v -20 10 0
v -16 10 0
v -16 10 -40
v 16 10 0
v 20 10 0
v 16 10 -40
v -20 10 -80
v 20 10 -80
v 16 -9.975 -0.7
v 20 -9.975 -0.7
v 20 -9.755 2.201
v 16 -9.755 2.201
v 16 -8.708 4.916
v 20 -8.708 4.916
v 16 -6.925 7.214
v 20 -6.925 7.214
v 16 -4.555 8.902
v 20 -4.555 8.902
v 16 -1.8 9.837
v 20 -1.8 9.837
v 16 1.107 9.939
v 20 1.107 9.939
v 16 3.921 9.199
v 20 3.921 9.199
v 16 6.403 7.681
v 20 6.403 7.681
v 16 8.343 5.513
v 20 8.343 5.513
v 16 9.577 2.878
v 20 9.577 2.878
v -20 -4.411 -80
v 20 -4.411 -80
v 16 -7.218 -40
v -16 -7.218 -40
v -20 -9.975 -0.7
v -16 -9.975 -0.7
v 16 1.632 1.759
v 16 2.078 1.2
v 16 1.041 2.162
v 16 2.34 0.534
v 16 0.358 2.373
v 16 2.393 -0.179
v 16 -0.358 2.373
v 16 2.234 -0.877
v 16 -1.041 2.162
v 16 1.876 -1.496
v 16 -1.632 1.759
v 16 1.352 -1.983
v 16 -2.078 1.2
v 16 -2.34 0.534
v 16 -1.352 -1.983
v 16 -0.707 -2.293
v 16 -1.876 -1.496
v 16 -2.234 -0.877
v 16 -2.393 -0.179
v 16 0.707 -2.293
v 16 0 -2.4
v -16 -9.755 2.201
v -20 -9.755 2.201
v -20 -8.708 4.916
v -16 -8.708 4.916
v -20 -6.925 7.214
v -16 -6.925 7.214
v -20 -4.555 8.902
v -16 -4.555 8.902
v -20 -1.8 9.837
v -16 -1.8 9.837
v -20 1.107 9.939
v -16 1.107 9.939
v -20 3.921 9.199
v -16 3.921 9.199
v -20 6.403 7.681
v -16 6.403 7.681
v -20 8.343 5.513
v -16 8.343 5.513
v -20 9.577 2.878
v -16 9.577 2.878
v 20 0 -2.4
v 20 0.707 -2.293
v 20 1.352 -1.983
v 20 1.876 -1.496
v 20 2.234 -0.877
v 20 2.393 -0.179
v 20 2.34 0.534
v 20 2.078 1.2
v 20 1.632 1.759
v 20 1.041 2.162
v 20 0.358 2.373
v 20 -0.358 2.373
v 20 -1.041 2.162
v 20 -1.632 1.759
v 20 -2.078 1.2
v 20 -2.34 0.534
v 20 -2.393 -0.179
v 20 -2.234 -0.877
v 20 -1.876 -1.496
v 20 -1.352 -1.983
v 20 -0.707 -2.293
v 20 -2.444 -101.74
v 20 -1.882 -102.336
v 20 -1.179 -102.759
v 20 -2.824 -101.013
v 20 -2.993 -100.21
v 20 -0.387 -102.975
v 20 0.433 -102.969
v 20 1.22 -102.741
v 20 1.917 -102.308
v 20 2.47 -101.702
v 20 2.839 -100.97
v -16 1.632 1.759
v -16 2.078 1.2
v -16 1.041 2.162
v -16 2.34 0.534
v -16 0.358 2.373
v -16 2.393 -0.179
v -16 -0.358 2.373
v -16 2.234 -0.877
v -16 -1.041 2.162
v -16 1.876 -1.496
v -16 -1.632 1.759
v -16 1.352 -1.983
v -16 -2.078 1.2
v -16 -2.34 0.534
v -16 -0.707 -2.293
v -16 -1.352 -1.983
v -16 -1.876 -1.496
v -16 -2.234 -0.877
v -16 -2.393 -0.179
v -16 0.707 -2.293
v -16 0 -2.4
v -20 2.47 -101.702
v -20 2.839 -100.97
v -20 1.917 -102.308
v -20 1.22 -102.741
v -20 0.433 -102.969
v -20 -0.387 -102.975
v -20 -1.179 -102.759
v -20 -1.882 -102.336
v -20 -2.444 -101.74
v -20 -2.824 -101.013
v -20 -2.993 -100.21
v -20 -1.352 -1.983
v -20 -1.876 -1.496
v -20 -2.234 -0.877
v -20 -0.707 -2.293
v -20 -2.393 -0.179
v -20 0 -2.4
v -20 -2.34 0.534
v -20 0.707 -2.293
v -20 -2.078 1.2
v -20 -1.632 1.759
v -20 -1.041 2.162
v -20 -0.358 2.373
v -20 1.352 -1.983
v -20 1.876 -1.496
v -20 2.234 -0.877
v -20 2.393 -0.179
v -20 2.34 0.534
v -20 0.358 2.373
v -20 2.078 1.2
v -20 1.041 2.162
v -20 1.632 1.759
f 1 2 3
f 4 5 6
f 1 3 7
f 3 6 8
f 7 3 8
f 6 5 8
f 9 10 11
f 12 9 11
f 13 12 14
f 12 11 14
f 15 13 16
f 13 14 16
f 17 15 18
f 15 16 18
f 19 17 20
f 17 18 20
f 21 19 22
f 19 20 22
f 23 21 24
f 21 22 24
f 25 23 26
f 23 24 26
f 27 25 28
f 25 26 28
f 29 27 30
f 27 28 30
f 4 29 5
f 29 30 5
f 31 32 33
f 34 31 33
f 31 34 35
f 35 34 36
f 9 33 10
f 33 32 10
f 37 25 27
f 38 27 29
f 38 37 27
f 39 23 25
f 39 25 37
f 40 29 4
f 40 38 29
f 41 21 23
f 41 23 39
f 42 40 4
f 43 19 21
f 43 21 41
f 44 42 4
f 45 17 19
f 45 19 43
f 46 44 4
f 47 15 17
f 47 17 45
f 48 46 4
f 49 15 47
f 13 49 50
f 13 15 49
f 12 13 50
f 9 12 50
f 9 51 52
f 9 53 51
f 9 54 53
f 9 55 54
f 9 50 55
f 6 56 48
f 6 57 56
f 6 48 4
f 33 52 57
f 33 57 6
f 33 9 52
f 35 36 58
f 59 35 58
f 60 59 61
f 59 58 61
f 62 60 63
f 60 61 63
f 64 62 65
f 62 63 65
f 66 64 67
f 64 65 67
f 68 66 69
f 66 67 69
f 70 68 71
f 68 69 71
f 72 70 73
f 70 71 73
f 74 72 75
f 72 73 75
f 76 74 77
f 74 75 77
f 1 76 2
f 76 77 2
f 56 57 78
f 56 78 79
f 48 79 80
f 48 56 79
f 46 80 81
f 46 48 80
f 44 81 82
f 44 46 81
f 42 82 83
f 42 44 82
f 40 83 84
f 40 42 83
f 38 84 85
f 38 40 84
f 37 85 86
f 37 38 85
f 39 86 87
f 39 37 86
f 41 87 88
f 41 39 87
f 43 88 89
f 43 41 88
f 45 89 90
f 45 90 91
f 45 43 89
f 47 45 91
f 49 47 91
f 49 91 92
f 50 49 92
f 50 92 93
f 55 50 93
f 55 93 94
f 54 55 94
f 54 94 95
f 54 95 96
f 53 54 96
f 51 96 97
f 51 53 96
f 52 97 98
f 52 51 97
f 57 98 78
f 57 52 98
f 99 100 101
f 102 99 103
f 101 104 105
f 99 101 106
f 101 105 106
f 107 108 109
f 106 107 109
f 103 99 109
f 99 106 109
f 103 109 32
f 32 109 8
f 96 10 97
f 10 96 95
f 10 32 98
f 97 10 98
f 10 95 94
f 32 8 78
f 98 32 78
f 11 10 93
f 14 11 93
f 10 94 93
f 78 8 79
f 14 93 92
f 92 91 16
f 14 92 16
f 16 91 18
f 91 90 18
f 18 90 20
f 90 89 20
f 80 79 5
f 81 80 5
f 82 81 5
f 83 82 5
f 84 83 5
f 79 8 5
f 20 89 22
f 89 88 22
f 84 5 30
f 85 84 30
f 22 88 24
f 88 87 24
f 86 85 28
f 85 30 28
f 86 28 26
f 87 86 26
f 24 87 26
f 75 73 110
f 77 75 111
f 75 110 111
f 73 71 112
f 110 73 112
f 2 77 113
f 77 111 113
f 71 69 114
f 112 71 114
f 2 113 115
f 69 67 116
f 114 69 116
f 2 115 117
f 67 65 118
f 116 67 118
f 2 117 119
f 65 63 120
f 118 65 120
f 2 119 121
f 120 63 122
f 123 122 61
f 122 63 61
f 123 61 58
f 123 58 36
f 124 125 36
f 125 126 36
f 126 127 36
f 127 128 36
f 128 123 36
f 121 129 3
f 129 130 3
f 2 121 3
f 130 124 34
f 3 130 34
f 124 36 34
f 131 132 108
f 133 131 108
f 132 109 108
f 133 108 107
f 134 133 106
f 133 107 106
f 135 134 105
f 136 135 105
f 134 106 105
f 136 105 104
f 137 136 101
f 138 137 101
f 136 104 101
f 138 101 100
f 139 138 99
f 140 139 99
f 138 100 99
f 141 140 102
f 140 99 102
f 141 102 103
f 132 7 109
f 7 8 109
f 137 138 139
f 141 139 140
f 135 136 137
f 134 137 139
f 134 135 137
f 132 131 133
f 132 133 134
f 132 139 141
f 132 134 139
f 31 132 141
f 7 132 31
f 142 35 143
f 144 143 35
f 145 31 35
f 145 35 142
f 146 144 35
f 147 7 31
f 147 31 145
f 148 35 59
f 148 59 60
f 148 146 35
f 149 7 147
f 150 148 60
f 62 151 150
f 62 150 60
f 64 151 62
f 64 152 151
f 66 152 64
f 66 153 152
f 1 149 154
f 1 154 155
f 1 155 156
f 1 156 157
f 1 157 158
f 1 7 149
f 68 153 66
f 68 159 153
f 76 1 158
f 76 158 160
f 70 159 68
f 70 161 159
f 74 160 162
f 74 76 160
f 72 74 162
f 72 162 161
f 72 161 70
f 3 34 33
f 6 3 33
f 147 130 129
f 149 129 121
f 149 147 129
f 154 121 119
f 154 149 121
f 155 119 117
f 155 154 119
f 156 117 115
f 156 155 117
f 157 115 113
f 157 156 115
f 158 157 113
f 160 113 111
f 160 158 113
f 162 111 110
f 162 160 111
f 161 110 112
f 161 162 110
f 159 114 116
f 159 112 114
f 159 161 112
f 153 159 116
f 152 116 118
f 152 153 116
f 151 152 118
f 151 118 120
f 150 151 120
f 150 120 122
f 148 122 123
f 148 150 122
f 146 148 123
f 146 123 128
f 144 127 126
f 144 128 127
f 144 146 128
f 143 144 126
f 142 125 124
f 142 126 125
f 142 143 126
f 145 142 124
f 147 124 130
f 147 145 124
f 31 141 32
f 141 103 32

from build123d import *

# Parameters (mm, degrees)
SKETCH1_R              = 2.4
ARM_DEPTH              = 20
ELBOW_MOUNT_DEPTH      = 106.399240984
ELBOW_MOUNT_DEPTH_BACK = 106.399240984
SKETCH2_W              = 32
SKETCH2_H              = 50


with BuildPart() as part:
    # Sketch1 → arm (new, symmetric)
    with BuildSketch(Plane(origin=(0, 0, 0), x_dir=(0, 0, -1), z_dir=(1, 0, 0))):
        with BuildLine():
            Line((0, 10), (80, 10))
            Line((80, 10), (100.969511188, 2.839022377))
            ThreePointArc((100.969511188, 2.839022377), (102.974875799, -0.387445454), (100.21, -2.992640974))
            Line((100.21, -2.992640974), (80, -4.410819779))
            Line((80, -4.410819779), (0.7, -9.975469914))
            ThreePointArc((0.7, -9.975469914), (-9.993865597, -0.350214836), (0, 10))
        make_face()
        Circle(SKETCH1_R, mode=Mode.SUBTRACT)
    extrude(amount=ARM_DEPTH, both=True)

    # Sketch2 → elbow mount (cut, two sides: drawn at the far end of the back side and taken through both)
    with BuildSketch(Plane(origin=(0, 0, 0), x_dir=(1, 0, 0), z_dir=(0, 1, 0)).offset(-ELBOW_MOUNT_DEPTH_BACK)):
        with Locations((0, 15)):
            Rectangle(SKETCH2_W, SKETCH2_H)
    extrude(amount=ELBOW_MOUNT_DEPTH + ELBOW_MOUNT_DEPTH_BACK, mode=Mode.SUBTRACT)


solid = part.part
